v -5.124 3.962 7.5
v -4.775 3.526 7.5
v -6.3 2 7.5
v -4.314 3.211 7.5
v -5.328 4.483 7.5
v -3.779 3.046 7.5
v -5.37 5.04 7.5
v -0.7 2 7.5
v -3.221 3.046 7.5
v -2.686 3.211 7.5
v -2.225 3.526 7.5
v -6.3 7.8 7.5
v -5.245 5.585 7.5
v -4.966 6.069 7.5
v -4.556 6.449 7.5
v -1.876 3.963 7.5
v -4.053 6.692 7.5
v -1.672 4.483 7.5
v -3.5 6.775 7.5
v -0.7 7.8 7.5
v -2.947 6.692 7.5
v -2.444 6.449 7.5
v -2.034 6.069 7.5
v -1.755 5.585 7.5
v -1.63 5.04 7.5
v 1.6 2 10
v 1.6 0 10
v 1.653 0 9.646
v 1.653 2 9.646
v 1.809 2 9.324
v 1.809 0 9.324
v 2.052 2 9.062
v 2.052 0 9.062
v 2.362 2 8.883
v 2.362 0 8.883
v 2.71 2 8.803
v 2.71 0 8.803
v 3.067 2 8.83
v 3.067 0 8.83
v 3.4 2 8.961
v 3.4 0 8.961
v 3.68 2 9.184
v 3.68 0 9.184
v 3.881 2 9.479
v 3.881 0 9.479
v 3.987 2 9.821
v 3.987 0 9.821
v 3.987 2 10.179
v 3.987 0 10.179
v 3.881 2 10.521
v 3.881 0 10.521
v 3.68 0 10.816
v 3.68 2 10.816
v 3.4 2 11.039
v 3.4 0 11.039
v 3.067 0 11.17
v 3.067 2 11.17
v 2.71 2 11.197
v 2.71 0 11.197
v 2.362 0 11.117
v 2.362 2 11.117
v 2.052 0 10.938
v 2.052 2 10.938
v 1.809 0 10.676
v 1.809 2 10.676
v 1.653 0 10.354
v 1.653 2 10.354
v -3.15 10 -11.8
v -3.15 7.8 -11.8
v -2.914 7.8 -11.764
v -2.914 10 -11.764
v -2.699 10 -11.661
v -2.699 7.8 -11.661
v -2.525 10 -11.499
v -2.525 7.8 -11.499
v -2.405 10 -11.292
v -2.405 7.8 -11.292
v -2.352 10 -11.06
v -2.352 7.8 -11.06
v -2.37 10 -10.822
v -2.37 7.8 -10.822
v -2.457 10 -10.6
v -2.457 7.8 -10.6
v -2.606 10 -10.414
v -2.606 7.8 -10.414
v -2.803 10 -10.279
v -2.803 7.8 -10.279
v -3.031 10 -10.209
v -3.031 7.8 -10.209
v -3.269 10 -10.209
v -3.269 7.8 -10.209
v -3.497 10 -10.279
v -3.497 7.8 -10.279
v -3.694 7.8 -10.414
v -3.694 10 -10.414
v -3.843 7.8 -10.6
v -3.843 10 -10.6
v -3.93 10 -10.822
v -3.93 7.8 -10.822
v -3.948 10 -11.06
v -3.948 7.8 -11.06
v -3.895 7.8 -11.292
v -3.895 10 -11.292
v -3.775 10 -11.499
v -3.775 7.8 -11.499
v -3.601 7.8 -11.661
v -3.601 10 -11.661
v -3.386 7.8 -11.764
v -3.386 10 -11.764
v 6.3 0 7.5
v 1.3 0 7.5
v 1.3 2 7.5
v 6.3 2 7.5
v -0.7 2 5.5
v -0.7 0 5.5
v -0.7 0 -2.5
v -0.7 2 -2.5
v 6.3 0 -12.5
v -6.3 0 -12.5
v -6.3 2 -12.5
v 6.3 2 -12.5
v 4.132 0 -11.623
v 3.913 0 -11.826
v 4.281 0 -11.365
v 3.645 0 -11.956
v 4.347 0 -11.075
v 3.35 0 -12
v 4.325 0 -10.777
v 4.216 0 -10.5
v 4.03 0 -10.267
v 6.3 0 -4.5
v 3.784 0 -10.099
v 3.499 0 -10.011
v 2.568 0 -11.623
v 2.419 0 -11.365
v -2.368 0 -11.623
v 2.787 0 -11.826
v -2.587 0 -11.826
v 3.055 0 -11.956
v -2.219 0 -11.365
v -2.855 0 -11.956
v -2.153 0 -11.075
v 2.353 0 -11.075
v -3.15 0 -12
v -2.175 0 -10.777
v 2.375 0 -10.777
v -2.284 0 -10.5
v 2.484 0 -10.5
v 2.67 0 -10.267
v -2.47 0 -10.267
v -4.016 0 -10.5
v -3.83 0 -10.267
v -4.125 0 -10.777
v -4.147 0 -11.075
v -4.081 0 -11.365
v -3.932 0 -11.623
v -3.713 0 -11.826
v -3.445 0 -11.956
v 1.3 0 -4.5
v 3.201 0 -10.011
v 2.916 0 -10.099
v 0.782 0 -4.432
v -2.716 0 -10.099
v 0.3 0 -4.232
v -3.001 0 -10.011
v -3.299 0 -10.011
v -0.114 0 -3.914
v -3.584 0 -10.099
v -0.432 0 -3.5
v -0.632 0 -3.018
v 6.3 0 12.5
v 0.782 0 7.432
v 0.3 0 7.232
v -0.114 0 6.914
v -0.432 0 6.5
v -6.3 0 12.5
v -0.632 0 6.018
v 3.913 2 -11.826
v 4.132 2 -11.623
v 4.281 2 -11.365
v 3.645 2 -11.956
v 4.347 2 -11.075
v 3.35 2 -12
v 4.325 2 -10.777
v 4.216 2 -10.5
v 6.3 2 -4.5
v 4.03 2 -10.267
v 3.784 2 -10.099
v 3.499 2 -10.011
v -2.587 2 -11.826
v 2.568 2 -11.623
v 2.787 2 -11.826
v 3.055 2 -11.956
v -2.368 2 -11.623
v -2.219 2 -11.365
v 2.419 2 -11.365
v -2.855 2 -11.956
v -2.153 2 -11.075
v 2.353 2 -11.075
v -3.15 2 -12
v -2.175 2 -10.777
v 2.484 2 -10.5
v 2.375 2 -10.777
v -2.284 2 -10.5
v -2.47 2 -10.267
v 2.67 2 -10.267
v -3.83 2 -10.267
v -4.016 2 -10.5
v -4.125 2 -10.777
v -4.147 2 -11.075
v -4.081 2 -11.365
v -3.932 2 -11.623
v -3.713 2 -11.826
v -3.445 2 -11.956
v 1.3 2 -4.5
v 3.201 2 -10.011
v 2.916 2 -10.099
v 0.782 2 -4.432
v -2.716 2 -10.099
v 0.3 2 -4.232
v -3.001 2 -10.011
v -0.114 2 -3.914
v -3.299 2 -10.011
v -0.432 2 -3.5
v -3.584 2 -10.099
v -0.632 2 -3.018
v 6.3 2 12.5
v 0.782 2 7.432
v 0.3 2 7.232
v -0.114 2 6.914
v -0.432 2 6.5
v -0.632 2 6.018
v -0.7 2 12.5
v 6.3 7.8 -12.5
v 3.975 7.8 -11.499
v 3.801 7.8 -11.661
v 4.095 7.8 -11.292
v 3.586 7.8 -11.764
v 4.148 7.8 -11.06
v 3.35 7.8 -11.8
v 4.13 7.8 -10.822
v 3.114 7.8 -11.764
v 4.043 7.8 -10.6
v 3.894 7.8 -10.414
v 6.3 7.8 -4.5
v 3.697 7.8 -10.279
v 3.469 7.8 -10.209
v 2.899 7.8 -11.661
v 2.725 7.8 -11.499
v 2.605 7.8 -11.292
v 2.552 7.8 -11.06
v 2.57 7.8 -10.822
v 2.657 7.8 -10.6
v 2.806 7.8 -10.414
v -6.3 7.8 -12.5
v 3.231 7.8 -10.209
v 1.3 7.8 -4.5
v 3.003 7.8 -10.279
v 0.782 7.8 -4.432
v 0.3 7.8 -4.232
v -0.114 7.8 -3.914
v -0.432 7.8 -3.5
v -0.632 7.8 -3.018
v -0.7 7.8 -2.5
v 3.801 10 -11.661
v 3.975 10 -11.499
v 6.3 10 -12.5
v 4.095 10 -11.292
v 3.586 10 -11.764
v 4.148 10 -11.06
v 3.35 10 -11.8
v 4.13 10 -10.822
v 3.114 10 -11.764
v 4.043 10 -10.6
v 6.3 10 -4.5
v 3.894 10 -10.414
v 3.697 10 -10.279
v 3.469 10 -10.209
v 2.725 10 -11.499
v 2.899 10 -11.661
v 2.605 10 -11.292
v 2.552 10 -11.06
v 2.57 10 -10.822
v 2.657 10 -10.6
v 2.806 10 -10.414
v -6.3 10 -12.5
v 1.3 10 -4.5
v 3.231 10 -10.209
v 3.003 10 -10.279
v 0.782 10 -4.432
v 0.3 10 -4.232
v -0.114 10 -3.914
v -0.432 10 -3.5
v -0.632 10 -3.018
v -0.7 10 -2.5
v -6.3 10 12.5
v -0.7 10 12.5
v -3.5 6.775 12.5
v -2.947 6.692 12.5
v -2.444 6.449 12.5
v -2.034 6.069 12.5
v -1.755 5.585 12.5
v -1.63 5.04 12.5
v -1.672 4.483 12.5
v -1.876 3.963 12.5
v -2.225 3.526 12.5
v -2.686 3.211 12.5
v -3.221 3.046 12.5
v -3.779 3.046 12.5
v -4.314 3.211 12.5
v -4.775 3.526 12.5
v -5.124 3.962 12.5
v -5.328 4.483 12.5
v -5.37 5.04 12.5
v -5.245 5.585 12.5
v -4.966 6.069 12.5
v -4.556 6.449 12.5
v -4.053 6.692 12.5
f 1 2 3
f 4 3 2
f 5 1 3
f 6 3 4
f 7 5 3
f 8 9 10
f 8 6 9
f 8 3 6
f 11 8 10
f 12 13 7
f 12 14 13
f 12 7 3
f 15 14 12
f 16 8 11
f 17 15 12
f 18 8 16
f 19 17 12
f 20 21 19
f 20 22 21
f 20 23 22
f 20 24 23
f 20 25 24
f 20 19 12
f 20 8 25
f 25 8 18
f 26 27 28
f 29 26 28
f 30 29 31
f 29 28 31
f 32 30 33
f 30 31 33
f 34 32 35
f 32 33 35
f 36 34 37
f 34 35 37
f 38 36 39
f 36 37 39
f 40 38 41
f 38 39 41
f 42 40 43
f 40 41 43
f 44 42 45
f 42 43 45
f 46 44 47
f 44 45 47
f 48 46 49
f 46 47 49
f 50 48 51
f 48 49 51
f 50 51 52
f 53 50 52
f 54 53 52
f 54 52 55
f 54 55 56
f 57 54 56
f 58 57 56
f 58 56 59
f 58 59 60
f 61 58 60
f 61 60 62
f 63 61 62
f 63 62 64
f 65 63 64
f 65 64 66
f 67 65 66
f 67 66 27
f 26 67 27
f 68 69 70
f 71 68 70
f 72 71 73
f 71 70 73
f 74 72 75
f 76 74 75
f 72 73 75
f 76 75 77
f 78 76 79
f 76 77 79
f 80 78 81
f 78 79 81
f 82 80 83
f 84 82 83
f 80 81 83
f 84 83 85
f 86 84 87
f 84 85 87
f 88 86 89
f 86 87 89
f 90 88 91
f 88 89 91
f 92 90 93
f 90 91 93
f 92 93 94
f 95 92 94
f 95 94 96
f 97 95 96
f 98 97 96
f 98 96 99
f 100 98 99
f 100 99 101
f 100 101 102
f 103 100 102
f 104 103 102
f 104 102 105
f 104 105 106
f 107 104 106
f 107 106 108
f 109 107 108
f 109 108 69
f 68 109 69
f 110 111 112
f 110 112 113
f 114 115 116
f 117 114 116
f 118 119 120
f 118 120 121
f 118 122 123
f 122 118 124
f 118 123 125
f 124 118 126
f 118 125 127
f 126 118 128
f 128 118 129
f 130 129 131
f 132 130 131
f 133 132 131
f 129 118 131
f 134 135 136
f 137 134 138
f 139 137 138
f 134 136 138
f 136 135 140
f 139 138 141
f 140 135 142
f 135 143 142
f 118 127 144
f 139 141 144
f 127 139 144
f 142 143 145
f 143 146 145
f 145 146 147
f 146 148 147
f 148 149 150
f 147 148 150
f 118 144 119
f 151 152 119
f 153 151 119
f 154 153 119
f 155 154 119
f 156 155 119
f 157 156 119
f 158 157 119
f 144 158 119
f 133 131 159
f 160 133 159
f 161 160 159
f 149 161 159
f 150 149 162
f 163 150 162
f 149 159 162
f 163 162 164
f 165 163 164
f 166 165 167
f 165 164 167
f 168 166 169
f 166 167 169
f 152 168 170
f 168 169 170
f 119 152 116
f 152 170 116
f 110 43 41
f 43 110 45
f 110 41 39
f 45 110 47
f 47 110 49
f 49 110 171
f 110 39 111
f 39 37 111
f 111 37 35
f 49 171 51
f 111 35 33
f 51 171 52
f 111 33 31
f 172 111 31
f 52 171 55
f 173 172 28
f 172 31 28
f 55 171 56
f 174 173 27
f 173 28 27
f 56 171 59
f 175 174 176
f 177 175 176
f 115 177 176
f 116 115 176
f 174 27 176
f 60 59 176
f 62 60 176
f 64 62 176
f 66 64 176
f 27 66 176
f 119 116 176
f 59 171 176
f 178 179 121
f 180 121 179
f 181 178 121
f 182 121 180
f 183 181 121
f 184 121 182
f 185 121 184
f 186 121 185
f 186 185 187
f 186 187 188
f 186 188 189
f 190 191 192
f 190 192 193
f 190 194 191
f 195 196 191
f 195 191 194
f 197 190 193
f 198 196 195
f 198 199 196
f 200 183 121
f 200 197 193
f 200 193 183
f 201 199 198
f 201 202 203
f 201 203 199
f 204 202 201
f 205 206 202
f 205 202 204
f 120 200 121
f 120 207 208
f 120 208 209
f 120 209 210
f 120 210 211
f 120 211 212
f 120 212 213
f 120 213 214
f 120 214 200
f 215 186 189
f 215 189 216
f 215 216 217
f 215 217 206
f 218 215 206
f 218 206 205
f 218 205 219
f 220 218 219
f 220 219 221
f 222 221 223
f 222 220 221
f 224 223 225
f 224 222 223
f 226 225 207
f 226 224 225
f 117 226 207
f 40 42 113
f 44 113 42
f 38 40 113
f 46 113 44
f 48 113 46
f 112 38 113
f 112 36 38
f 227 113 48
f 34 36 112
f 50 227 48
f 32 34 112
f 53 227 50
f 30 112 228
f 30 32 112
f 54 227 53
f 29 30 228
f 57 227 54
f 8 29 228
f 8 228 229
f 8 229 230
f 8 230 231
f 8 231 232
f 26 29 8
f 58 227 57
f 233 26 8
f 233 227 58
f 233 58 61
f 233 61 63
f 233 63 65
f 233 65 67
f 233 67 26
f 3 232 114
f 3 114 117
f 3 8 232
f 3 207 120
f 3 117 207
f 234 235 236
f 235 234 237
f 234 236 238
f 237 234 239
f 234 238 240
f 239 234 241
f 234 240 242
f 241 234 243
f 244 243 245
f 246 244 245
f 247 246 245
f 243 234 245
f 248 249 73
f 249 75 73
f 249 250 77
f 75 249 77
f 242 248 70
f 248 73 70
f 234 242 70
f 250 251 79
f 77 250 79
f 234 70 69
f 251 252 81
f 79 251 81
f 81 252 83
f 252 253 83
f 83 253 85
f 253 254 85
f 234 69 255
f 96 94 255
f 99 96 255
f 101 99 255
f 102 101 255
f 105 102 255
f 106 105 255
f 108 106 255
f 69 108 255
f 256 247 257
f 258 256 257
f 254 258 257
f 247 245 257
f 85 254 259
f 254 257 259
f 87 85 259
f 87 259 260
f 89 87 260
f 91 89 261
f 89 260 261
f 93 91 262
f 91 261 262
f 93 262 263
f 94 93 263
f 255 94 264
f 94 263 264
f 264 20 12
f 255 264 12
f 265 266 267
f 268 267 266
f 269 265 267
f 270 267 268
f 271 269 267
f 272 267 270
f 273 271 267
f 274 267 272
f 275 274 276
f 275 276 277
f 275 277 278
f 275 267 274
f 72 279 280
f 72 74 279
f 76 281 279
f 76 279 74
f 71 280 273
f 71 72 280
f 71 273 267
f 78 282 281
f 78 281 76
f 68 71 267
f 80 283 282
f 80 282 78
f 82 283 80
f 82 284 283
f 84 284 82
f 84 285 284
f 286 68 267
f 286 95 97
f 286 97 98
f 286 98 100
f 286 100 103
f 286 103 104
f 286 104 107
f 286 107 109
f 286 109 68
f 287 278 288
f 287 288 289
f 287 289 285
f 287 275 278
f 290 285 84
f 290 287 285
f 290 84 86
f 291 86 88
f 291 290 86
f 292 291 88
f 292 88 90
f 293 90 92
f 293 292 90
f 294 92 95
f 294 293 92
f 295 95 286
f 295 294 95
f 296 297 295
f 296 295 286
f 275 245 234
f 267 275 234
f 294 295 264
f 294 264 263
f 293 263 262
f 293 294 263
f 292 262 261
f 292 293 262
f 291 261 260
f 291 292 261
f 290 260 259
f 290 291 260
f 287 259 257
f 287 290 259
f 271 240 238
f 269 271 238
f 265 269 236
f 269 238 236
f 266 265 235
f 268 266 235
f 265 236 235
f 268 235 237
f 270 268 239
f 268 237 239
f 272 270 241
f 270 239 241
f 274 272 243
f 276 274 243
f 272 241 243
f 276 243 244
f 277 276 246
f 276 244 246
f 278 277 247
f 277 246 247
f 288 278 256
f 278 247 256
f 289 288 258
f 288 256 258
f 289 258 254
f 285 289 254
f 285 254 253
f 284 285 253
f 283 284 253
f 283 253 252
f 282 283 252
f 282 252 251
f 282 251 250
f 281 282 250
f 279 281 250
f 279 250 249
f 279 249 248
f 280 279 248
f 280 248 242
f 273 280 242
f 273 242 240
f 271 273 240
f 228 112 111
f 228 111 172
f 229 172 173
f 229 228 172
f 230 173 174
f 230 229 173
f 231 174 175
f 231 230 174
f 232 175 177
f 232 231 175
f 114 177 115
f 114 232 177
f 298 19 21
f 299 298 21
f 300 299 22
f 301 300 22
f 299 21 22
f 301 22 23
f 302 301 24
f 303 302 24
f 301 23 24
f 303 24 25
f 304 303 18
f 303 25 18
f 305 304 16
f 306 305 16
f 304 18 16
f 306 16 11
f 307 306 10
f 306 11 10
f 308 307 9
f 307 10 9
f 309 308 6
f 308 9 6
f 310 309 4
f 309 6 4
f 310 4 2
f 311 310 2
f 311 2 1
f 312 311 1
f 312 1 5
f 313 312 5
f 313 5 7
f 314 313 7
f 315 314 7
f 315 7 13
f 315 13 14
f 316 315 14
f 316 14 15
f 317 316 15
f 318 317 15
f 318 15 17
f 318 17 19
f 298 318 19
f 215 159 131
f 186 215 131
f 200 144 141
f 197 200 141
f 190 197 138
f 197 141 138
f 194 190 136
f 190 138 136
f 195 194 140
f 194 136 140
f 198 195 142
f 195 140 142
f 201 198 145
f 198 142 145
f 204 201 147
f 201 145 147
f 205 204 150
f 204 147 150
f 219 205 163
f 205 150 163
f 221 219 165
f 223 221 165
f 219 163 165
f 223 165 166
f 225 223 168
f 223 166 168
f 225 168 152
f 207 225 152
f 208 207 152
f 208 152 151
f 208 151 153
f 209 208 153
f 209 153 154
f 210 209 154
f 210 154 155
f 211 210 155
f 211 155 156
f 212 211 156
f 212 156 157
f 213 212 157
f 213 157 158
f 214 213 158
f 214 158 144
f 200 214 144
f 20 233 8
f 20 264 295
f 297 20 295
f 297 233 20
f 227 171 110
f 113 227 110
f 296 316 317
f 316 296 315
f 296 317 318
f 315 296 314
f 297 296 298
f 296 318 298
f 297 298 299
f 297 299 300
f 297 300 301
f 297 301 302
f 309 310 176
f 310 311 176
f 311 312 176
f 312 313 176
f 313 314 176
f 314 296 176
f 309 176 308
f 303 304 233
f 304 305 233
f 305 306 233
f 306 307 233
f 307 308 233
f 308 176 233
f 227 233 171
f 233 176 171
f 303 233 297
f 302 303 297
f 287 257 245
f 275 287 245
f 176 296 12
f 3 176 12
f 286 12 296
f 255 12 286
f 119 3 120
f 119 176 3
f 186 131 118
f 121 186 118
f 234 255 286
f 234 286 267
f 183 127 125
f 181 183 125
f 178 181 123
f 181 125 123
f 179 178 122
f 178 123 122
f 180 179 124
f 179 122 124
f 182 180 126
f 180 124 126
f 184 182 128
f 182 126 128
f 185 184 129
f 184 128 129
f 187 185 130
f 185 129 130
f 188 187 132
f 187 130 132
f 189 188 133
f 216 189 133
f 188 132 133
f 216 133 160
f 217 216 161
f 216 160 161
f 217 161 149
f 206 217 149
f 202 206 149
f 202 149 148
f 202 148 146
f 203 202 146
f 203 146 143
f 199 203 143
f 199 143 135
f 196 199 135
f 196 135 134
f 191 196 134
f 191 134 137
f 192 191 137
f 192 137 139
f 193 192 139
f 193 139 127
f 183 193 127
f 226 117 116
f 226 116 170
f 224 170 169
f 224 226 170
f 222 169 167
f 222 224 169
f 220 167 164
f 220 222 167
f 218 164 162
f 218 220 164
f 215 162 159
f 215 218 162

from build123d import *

# Parameters (mm, degrees)
SKETCH1_W                   = 12.6
SKETCH1_H                   = 25
BOSS_EXTRUDE1_DEPTH         = 10
SKETCH14_W                  = 7
SKETCH14_H                  = 5.8
CUT_EXTRUDE9_DEPTH          = 28.653028767
SKETCH15_W                  = 20
SKETCH15_H                  = 5.8
CUT_EXTRUDE10_DEPTH         = 18.47140521
CUT_EXTRUDE11_DEPTH         = 17.122654868
CUT_EXTRUDE11_DEPTH_BACK    = 17.122654868
SKETCH17_W                  = 7
SKETCH17_H                  = 12
SKETCH18_R                  = 1.875
CUT_EXTRUDE12_DEPTH         = 24.231228982
SKETCH19_W                  = 7
SKETCH19_H                  = 5
CUT_EXTRUDE13_DEPTH         = 2.2
FILLET2_R                   = 2
SKETCH20_R                  = 1
CUT_EXTRUDE18_DEPTH         = 5
TAP_DRILL_FOR_M2X0_4_TAP2_D = 1.6
M2_CLEARANCE_HOLE2_D        = 2.4


with BuildPart() as part:
    # Sketch1 → Boss-Extrude1 (new body)
    with BuildSketch(Plane(origin=(0, 0, 0), x_dir=(1, 0, 0), z_dir=(0, 1, 0))):
        Rectangle(SKETCH1_W, SKETCH1_H)
    extrude(amount=BOSS_EXTRUDE1_DEPTH)

    # Sketch14 → Cut-Extrude9 (cut, through all)
    with BuildSketch(Plane.XY.offset(12.5)):
        with Locations((2.8, 4.9)):
            Rectangle(SKETCH14_W, SKETCH14_H)
    extrude(amount=-CUT_EXTRUDE9_DEPTH, mode=Mode.SUBTRACT)

    # Sketch15 → Cut-Extrude10 (cut, through all)
    with BuildSketch(Plane(origin=(-0.7, 0, 0), x_dir=(0, 0, -1), z_dir=(1, 0, 0))):
        with Locations((2.5, 4.9)):
            Rectangle(SKETCH15_W, SKETCH15_H)
    extrude(amount=-CUT_EXTRUDE10_DEPTH, mode=Mode.SUBTRACT)

    # Sketch17 → Cut-Extrude11 (cut, two sides: drawn at the far end of the back side and taken through both)
    with BuildSketch(Plane(origin=(0, 2, 0), x_dir=(1, 0, 0), z_dir=(0, 1, 0)).offset(-CUT_EXTRUDE11_DEPTH_BACK)):
        with Locations((2.8, -1.5)):
            Rectangle(SKETCH17_W, SKETCH17_H)
    extrude(amount=CUT_EXTRUDE11_DEPTH + CUT_EXTRUDE11_DEPTH_BACK, mode=Mode.SUBTRACT)

    # Sketch18 → Cut-Extrude12 (cut, through all)
    with BuildSketch(Plane(origin=(0, 0, 7.5), x_dir=(-1, 0, 0), z_dir=(0, 0, -1))):
        with Locations(Location((3.5, 4.9, 0), (0, 0, 90))):
            Circle(SKETCH18_R)
    extrude(amount=-CUT_EXTRUDE12_DEPTH, mode=Mode.SUBTRACT)

    # Sketch19 → Cut-Extrude13 (cut)
    with BuildSketch(Plane(origin=(0, 10, 0), x_dir=(1, 0, 0), z_dir=(0, 1, 0))):
        with Locations((2.8, -10)):
            Rectangle(SKETCH19_W, SKETCH19_H)
    extrude(amount=-CUT_EXTRUDE13_DEPTH, mode=Mode.SUBTRACT)

    # Fillet2
    # the kernel refuses this fillet: 2 mm, written as the material it adds along each edge
    with BuildSketch(Plane(origin=(-0.7, 2, -4.5), x_dir=(1, 0, 0), z_dir=(0, -1, 0)), Plane(origin=(-0.7, 2, 7.5), x_dir=(0, 0, -1), z_dir=(0, -1, 0))) as fillet2_piece_1:
        with BuildLine():
            CenterArc((FILLET2_R, FILLET2_R), FILLET2_R, 180, 90)
            Line((0, FILLET2_R), (0, 0))
            Line((0, 0), (FILLET2_R, 0))
        make_face()
    extrude(amount=2)
    with BuildSketch(Plane(origin=(-0.7, 10, -4.5), x_dir=(1, 0, 0), z_dir=(0, -1, 0))) as fillet2_piece_2:
        with BuildLine():
            CenterArc((FILLET2_R, FILLET2_R), FILLET2_R, 180, 90)
            Line((0, FILLET2_R), (0, 0))
            Line((0, 0), (FILLET2_R, 0))
        make_face()
    extrude(amount=2.2)

    # Sketch20 → Cut-Extrude18 (cut)
    with BuildSketch(Plane.XZ):
        with Locations(Location((3.35, -11, 0), (0, 0, 270))):
            Circle(SKETCH20_R)
        with Locations(Location((-3.15, -11, 0), (0, 0, 270))):
            Circle(SKETCH20_R)
    extrude(amount=-CUT_EXTRUDE18_DEPTH, mode=Mode.SUBTRACT)

    # Tap Drill for M2x0.4 Tap2 (through all)
    with Locations(Plane(origin=(3.35, 10, -11), x_dir=(0, 0, 1), z_dir=(0, 1, 0))):
        with Locations((0, 0), (0, -6.5)):
            Hole(TAP_DRILL_FOR_M2X0_4_TAP2_D / 2)

    # M2 Clearance Hole2 (through all)
    with Locations(Plane(origin=(2.8, 2, 10), x_dir=(1, 0, 0), z_dir=(0, 1, 0))):
        with Locations((0, 0)):
            Hole(M2_CLEARANCE_HOLE2_D / 2)


solid = part.part
